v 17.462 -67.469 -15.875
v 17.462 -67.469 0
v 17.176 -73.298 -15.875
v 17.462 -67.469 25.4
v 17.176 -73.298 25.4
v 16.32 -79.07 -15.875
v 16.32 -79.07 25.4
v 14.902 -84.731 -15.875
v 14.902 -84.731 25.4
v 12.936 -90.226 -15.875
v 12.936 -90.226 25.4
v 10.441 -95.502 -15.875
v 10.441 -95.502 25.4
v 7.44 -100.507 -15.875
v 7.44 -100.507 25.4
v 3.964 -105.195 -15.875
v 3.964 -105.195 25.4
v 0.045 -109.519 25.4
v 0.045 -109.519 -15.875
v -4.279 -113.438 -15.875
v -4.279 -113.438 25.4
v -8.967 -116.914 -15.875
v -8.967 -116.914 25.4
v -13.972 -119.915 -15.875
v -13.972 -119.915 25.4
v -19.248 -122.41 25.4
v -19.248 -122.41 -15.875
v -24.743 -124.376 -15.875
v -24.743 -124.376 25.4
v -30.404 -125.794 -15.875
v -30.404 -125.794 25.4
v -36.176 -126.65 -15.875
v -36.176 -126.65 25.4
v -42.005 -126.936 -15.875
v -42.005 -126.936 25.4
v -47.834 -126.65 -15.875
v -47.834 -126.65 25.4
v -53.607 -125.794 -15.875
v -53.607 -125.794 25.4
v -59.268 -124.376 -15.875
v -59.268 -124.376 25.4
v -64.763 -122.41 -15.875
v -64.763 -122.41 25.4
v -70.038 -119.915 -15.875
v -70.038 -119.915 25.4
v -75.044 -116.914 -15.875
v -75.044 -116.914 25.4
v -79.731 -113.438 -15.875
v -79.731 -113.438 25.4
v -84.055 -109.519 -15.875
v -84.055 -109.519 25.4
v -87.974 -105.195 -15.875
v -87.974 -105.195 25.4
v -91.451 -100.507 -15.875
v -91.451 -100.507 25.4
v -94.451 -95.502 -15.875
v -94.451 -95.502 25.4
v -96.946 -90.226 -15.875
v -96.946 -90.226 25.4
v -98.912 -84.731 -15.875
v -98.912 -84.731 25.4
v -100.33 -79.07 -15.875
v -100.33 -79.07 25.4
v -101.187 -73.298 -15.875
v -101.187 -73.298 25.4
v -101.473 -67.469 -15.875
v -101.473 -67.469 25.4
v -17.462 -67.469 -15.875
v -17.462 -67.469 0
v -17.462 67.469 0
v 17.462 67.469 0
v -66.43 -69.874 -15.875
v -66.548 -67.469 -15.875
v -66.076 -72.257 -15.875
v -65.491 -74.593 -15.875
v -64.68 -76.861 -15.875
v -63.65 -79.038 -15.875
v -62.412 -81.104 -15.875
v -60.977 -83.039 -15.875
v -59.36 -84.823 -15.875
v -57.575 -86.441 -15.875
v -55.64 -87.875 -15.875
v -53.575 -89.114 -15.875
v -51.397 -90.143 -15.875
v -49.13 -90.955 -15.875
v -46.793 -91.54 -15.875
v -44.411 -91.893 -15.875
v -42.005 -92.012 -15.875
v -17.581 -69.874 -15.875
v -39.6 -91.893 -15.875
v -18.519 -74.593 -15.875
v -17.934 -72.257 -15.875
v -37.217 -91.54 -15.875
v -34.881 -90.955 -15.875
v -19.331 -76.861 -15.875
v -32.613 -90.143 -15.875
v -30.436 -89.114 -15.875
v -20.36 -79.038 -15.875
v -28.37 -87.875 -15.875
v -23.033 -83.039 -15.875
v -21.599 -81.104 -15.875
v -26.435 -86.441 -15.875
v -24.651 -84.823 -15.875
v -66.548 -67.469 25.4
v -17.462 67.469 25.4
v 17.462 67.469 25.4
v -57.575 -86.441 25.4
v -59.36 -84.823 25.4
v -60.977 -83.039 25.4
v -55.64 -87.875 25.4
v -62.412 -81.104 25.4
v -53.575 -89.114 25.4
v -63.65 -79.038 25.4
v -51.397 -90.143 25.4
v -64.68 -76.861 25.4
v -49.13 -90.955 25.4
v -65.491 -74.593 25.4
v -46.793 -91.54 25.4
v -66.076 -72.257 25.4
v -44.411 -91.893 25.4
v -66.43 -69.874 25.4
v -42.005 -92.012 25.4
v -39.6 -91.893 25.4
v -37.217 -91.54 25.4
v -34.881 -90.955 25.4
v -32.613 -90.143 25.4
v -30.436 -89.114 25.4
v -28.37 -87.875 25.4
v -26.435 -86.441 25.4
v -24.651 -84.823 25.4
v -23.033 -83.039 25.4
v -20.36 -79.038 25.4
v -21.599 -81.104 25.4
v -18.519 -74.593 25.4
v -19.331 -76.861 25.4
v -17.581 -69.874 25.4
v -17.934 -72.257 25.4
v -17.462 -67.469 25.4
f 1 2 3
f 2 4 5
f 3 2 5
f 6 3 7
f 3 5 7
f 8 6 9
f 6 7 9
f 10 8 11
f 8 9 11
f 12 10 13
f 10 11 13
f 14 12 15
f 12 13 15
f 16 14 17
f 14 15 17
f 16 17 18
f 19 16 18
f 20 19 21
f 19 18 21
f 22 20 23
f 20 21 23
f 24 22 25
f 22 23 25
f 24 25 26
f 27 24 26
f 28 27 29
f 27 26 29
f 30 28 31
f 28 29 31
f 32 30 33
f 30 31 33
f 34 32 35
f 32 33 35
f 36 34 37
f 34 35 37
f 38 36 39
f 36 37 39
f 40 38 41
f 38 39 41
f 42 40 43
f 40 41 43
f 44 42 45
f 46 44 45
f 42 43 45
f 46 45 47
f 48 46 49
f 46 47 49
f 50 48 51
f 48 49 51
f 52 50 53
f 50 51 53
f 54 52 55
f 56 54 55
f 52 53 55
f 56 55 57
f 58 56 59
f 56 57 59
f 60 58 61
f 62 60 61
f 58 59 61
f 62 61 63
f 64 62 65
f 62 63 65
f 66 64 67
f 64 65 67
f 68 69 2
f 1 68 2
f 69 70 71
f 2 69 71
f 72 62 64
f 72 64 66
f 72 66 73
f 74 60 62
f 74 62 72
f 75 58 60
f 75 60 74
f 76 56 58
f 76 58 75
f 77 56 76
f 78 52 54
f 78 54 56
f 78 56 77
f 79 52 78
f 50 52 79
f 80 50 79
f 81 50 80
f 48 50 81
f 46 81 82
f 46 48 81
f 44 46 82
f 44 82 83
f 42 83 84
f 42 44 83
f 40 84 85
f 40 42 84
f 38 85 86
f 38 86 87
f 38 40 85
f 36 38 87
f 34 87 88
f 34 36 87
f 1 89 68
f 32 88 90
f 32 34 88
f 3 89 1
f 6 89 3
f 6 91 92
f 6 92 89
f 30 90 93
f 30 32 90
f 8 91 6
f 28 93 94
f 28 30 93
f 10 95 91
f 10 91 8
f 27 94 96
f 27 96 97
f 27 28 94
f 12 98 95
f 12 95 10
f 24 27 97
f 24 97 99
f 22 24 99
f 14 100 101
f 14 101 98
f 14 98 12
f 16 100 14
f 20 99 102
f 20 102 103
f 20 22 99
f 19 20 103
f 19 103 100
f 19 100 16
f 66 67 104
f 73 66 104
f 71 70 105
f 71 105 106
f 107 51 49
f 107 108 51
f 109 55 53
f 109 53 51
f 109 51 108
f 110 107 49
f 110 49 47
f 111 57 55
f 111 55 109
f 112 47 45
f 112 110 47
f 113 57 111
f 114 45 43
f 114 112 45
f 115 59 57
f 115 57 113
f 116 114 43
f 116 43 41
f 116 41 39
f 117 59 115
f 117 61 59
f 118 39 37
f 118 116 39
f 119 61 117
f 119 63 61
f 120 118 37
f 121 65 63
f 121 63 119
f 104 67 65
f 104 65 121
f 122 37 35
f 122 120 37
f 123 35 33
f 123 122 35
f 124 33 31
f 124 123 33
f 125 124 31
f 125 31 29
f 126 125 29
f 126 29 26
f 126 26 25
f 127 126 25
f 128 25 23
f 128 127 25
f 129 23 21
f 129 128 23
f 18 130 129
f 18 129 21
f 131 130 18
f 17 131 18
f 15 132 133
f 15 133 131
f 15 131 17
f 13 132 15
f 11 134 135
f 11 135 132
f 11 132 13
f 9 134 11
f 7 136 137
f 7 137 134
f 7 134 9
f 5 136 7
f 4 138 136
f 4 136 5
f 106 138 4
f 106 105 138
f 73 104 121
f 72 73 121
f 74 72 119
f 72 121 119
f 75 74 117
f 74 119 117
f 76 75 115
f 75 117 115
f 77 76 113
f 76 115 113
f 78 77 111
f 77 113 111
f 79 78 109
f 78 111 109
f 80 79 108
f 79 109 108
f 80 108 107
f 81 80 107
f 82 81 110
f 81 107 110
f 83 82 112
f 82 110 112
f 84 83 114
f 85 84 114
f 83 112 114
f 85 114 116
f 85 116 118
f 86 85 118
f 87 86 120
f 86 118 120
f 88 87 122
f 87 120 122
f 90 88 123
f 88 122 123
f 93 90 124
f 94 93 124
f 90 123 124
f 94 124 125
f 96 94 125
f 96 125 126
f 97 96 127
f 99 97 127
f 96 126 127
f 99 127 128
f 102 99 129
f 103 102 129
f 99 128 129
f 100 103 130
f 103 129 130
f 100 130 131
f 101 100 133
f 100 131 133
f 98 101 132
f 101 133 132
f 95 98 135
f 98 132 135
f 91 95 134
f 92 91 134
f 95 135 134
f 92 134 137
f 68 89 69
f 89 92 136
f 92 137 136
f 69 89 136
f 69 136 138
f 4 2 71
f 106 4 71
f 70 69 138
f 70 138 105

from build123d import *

# Parameters (mm, degrees)
F0_W     = 34.925
F0_H     = 134.9375
F1_DEPTH = 25.4
F2_DEPTH = 25.4
F4_DEPTH = 15.875


with BuildPart() as f1:
    # F0 (on Top) → F1 (new body)
    with BuildSketch(Plane.XY):
        Rectangle(F0_W, F0_H)
    extrude(amount=F1_DEPTH)

    # F0 (on Top) → F2 (join)
    with BuildSketch(Plane.XY):
        Rectangle(F0_W, F0_H)
        with BuildLine():
            Line((17.4625, -67.46875), (-17.4625, -67.46875))
            ThreePointArc((-17.4625, -67.46875), (-42.00525, -92.0115), (-66.548, -67.46875))
            Line((-66.548, -67.46875), (-101.473, -67.46875))
            ThreePointArc((-101.473, -67.46875), (-42.00525, -126.9365), (17.4625, -67.46875))
        make_face()
    extrude(amount=F2_DEPTH)

    # F3 (on face) → F4 (join)
    with BuildSketch(Plane(origin=(0, 0, 0), x_dir=(1, 0, 0), z_dir=(0, 0, -1))):
        with BuildLine():
            ThreePointArc((-66.548, 67.46875), (-42.00525, 92.0115), (-17.4625, 67.46875))
            Line((-17.4625, 67.46875), (17.4625, 67.46875))
            ThreePointArc((17.4625, 67.46875), (-42.00525, 126.9365), (-101.473, 67.46875))
            Line((-101.473, 67.46875), (-66.548, 67.46875))
        make_face()
    extrude(amount=F4_DEPTH)


solid = f1.part
